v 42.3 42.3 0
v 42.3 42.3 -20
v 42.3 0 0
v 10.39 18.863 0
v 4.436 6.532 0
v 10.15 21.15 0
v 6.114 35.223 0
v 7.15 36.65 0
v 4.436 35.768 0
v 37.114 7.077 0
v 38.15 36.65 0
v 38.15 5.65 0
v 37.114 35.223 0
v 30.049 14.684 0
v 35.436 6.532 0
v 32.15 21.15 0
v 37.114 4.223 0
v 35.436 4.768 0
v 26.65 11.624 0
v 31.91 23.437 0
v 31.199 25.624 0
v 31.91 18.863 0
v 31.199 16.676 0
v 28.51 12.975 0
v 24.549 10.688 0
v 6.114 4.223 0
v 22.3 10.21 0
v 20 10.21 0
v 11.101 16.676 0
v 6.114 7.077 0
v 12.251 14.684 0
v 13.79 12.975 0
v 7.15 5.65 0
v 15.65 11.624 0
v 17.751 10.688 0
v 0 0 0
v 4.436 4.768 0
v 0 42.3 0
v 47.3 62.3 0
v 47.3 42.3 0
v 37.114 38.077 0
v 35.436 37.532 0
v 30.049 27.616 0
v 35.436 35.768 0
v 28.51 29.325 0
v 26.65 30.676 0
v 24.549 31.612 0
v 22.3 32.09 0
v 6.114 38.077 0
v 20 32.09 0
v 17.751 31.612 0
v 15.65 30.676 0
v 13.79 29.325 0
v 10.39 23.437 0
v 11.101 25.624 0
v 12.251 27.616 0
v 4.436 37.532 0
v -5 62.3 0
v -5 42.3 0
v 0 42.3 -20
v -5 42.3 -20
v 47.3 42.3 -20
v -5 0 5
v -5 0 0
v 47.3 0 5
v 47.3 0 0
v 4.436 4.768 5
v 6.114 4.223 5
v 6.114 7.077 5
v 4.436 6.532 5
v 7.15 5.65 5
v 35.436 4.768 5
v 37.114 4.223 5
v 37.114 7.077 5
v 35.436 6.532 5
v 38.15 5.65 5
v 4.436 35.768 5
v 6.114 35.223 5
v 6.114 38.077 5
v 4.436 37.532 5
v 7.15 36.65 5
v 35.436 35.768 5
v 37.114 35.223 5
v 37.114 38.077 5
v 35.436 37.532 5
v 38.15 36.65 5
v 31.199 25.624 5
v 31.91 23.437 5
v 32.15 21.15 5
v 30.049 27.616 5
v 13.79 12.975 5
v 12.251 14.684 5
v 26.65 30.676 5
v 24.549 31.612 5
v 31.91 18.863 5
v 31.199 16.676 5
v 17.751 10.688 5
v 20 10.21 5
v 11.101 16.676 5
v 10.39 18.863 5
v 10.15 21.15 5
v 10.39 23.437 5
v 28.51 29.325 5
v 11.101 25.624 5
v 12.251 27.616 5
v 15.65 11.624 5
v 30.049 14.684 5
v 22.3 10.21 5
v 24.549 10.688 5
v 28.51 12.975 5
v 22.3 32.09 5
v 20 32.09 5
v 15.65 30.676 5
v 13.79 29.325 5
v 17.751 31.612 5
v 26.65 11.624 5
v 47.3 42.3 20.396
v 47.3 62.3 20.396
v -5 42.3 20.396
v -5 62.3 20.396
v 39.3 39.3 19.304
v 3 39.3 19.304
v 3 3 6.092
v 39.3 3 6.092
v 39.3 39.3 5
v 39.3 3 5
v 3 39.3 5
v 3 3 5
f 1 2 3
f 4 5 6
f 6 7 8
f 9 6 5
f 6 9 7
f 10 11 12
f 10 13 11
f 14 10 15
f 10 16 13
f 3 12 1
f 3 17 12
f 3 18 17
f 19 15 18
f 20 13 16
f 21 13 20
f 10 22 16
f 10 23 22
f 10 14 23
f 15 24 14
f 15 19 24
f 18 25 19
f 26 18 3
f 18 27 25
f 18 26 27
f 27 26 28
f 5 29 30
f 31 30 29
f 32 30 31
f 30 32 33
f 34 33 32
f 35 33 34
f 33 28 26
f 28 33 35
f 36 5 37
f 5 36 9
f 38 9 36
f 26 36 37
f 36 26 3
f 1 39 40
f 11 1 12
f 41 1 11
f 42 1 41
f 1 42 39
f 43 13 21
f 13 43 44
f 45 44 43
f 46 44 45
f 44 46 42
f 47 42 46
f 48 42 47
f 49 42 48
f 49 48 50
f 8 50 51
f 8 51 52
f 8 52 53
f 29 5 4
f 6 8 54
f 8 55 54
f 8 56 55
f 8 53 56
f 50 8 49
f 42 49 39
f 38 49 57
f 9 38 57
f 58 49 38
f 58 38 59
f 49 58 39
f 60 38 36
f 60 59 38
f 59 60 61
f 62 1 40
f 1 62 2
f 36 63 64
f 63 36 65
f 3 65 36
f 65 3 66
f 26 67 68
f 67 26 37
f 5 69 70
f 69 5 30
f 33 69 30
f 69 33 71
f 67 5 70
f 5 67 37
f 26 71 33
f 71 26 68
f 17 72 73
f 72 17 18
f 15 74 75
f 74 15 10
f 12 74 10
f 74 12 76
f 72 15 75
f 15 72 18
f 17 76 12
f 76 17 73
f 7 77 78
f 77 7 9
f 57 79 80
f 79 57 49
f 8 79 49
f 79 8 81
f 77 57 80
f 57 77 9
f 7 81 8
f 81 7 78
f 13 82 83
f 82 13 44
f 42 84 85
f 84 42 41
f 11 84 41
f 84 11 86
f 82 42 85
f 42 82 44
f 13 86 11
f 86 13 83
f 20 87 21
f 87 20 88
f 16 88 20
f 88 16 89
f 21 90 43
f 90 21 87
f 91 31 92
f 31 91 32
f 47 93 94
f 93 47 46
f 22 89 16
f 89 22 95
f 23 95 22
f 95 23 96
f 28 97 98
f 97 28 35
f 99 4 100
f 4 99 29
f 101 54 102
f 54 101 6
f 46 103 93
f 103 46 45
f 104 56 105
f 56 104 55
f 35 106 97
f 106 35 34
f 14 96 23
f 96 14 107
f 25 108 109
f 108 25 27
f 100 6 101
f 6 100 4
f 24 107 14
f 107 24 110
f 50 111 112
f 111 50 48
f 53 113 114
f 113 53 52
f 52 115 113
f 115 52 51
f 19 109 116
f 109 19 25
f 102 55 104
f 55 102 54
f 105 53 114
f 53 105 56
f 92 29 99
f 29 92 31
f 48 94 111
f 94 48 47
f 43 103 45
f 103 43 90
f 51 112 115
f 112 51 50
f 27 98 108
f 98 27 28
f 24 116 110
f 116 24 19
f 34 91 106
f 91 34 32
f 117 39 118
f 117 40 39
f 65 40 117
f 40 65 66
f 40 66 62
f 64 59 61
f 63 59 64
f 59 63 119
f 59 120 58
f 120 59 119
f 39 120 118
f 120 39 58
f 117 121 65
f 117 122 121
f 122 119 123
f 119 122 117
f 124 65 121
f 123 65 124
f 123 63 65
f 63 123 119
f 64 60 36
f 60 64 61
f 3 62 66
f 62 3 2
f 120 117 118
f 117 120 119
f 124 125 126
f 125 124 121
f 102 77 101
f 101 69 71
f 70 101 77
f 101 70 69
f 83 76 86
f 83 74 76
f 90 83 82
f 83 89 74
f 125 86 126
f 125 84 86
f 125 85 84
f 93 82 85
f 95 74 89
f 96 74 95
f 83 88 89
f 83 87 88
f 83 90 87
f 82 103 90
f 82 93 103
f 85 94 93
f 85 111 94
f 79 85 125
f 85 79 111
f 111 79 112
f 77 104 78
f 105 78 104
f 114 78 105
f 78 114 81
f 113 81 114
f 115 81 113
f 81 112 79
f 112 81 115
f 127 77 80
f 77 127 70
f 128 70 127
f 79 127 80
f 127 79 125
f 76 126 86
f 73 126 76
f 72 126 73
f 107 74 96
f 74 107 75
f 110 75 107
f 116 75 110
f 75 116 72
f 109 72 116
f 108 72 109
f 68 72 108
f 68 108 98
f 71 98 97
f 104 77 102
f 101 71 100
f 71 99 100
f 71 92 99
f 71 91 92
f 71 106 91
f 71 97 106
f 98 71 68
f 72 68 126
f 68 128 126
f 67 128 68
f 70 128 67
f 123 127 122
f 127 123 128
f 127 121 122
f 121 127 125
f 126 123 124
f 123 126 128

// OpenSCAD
difference() {
    translate([-5, 0, -20]) cube([42.3+5*2, 42.3+20, 60]);
    translate([0, 0, -40]) motor(h=100);
    translate([-5, 0, 5]) rotate([20, 0, 0]) cube([42.3+5*2, 42.3+20, 30]);
    translate([-5, 0, 0]) mirror([0, 0, 1])
        rotate([asin(20/(sqrt(pow(20, 2)+pow(42.3, 2)))), 0, 0]) 
        cube([42.3+5*2, 42.3+20, 30]);

    //translate([0, 42.3+20, 5]) mirror([0, 1, 0]) rotate([45, 0, 0]) cube([42.3, 42.3+20, 30]);
    translate([-5, 0, tan(20)*42.3+5]) cube([42.3+5*2, 42.3+20, 30]);
    translate([-5, 42.3, -30]) cube([42.3+5*2, 42.3+20, 30]);
    translate([3, 3, 5]) cube([42.3-3*2, 42.3-3*2, 30]);
}



module motor(motor_width = 42.3, motor_height = 40, h=10) {
    screw_spacing = 31;
    screw = (motor_width-screw_spacing)/2;
    cube([motor_width, motor_width, motor_height]);
    translate([screw,screw,motor_height]) cylinder(h=h,r=1.5);
    translate([screw+screw_spacing,screw,motor_height]) cylinder(h=h,r=1.5);
    translate([screw,screw+screw_spacing,motor_height]) cylinder(h=h,r=1.5);
    translate([screw+screw_spacing,screw+screw_spacing,motor_height]) cylinder(h=h,r=1.5);
    translate([motor_width/2,motor_width/2,motor_height]) cylinder(h=h,r=11);
}
